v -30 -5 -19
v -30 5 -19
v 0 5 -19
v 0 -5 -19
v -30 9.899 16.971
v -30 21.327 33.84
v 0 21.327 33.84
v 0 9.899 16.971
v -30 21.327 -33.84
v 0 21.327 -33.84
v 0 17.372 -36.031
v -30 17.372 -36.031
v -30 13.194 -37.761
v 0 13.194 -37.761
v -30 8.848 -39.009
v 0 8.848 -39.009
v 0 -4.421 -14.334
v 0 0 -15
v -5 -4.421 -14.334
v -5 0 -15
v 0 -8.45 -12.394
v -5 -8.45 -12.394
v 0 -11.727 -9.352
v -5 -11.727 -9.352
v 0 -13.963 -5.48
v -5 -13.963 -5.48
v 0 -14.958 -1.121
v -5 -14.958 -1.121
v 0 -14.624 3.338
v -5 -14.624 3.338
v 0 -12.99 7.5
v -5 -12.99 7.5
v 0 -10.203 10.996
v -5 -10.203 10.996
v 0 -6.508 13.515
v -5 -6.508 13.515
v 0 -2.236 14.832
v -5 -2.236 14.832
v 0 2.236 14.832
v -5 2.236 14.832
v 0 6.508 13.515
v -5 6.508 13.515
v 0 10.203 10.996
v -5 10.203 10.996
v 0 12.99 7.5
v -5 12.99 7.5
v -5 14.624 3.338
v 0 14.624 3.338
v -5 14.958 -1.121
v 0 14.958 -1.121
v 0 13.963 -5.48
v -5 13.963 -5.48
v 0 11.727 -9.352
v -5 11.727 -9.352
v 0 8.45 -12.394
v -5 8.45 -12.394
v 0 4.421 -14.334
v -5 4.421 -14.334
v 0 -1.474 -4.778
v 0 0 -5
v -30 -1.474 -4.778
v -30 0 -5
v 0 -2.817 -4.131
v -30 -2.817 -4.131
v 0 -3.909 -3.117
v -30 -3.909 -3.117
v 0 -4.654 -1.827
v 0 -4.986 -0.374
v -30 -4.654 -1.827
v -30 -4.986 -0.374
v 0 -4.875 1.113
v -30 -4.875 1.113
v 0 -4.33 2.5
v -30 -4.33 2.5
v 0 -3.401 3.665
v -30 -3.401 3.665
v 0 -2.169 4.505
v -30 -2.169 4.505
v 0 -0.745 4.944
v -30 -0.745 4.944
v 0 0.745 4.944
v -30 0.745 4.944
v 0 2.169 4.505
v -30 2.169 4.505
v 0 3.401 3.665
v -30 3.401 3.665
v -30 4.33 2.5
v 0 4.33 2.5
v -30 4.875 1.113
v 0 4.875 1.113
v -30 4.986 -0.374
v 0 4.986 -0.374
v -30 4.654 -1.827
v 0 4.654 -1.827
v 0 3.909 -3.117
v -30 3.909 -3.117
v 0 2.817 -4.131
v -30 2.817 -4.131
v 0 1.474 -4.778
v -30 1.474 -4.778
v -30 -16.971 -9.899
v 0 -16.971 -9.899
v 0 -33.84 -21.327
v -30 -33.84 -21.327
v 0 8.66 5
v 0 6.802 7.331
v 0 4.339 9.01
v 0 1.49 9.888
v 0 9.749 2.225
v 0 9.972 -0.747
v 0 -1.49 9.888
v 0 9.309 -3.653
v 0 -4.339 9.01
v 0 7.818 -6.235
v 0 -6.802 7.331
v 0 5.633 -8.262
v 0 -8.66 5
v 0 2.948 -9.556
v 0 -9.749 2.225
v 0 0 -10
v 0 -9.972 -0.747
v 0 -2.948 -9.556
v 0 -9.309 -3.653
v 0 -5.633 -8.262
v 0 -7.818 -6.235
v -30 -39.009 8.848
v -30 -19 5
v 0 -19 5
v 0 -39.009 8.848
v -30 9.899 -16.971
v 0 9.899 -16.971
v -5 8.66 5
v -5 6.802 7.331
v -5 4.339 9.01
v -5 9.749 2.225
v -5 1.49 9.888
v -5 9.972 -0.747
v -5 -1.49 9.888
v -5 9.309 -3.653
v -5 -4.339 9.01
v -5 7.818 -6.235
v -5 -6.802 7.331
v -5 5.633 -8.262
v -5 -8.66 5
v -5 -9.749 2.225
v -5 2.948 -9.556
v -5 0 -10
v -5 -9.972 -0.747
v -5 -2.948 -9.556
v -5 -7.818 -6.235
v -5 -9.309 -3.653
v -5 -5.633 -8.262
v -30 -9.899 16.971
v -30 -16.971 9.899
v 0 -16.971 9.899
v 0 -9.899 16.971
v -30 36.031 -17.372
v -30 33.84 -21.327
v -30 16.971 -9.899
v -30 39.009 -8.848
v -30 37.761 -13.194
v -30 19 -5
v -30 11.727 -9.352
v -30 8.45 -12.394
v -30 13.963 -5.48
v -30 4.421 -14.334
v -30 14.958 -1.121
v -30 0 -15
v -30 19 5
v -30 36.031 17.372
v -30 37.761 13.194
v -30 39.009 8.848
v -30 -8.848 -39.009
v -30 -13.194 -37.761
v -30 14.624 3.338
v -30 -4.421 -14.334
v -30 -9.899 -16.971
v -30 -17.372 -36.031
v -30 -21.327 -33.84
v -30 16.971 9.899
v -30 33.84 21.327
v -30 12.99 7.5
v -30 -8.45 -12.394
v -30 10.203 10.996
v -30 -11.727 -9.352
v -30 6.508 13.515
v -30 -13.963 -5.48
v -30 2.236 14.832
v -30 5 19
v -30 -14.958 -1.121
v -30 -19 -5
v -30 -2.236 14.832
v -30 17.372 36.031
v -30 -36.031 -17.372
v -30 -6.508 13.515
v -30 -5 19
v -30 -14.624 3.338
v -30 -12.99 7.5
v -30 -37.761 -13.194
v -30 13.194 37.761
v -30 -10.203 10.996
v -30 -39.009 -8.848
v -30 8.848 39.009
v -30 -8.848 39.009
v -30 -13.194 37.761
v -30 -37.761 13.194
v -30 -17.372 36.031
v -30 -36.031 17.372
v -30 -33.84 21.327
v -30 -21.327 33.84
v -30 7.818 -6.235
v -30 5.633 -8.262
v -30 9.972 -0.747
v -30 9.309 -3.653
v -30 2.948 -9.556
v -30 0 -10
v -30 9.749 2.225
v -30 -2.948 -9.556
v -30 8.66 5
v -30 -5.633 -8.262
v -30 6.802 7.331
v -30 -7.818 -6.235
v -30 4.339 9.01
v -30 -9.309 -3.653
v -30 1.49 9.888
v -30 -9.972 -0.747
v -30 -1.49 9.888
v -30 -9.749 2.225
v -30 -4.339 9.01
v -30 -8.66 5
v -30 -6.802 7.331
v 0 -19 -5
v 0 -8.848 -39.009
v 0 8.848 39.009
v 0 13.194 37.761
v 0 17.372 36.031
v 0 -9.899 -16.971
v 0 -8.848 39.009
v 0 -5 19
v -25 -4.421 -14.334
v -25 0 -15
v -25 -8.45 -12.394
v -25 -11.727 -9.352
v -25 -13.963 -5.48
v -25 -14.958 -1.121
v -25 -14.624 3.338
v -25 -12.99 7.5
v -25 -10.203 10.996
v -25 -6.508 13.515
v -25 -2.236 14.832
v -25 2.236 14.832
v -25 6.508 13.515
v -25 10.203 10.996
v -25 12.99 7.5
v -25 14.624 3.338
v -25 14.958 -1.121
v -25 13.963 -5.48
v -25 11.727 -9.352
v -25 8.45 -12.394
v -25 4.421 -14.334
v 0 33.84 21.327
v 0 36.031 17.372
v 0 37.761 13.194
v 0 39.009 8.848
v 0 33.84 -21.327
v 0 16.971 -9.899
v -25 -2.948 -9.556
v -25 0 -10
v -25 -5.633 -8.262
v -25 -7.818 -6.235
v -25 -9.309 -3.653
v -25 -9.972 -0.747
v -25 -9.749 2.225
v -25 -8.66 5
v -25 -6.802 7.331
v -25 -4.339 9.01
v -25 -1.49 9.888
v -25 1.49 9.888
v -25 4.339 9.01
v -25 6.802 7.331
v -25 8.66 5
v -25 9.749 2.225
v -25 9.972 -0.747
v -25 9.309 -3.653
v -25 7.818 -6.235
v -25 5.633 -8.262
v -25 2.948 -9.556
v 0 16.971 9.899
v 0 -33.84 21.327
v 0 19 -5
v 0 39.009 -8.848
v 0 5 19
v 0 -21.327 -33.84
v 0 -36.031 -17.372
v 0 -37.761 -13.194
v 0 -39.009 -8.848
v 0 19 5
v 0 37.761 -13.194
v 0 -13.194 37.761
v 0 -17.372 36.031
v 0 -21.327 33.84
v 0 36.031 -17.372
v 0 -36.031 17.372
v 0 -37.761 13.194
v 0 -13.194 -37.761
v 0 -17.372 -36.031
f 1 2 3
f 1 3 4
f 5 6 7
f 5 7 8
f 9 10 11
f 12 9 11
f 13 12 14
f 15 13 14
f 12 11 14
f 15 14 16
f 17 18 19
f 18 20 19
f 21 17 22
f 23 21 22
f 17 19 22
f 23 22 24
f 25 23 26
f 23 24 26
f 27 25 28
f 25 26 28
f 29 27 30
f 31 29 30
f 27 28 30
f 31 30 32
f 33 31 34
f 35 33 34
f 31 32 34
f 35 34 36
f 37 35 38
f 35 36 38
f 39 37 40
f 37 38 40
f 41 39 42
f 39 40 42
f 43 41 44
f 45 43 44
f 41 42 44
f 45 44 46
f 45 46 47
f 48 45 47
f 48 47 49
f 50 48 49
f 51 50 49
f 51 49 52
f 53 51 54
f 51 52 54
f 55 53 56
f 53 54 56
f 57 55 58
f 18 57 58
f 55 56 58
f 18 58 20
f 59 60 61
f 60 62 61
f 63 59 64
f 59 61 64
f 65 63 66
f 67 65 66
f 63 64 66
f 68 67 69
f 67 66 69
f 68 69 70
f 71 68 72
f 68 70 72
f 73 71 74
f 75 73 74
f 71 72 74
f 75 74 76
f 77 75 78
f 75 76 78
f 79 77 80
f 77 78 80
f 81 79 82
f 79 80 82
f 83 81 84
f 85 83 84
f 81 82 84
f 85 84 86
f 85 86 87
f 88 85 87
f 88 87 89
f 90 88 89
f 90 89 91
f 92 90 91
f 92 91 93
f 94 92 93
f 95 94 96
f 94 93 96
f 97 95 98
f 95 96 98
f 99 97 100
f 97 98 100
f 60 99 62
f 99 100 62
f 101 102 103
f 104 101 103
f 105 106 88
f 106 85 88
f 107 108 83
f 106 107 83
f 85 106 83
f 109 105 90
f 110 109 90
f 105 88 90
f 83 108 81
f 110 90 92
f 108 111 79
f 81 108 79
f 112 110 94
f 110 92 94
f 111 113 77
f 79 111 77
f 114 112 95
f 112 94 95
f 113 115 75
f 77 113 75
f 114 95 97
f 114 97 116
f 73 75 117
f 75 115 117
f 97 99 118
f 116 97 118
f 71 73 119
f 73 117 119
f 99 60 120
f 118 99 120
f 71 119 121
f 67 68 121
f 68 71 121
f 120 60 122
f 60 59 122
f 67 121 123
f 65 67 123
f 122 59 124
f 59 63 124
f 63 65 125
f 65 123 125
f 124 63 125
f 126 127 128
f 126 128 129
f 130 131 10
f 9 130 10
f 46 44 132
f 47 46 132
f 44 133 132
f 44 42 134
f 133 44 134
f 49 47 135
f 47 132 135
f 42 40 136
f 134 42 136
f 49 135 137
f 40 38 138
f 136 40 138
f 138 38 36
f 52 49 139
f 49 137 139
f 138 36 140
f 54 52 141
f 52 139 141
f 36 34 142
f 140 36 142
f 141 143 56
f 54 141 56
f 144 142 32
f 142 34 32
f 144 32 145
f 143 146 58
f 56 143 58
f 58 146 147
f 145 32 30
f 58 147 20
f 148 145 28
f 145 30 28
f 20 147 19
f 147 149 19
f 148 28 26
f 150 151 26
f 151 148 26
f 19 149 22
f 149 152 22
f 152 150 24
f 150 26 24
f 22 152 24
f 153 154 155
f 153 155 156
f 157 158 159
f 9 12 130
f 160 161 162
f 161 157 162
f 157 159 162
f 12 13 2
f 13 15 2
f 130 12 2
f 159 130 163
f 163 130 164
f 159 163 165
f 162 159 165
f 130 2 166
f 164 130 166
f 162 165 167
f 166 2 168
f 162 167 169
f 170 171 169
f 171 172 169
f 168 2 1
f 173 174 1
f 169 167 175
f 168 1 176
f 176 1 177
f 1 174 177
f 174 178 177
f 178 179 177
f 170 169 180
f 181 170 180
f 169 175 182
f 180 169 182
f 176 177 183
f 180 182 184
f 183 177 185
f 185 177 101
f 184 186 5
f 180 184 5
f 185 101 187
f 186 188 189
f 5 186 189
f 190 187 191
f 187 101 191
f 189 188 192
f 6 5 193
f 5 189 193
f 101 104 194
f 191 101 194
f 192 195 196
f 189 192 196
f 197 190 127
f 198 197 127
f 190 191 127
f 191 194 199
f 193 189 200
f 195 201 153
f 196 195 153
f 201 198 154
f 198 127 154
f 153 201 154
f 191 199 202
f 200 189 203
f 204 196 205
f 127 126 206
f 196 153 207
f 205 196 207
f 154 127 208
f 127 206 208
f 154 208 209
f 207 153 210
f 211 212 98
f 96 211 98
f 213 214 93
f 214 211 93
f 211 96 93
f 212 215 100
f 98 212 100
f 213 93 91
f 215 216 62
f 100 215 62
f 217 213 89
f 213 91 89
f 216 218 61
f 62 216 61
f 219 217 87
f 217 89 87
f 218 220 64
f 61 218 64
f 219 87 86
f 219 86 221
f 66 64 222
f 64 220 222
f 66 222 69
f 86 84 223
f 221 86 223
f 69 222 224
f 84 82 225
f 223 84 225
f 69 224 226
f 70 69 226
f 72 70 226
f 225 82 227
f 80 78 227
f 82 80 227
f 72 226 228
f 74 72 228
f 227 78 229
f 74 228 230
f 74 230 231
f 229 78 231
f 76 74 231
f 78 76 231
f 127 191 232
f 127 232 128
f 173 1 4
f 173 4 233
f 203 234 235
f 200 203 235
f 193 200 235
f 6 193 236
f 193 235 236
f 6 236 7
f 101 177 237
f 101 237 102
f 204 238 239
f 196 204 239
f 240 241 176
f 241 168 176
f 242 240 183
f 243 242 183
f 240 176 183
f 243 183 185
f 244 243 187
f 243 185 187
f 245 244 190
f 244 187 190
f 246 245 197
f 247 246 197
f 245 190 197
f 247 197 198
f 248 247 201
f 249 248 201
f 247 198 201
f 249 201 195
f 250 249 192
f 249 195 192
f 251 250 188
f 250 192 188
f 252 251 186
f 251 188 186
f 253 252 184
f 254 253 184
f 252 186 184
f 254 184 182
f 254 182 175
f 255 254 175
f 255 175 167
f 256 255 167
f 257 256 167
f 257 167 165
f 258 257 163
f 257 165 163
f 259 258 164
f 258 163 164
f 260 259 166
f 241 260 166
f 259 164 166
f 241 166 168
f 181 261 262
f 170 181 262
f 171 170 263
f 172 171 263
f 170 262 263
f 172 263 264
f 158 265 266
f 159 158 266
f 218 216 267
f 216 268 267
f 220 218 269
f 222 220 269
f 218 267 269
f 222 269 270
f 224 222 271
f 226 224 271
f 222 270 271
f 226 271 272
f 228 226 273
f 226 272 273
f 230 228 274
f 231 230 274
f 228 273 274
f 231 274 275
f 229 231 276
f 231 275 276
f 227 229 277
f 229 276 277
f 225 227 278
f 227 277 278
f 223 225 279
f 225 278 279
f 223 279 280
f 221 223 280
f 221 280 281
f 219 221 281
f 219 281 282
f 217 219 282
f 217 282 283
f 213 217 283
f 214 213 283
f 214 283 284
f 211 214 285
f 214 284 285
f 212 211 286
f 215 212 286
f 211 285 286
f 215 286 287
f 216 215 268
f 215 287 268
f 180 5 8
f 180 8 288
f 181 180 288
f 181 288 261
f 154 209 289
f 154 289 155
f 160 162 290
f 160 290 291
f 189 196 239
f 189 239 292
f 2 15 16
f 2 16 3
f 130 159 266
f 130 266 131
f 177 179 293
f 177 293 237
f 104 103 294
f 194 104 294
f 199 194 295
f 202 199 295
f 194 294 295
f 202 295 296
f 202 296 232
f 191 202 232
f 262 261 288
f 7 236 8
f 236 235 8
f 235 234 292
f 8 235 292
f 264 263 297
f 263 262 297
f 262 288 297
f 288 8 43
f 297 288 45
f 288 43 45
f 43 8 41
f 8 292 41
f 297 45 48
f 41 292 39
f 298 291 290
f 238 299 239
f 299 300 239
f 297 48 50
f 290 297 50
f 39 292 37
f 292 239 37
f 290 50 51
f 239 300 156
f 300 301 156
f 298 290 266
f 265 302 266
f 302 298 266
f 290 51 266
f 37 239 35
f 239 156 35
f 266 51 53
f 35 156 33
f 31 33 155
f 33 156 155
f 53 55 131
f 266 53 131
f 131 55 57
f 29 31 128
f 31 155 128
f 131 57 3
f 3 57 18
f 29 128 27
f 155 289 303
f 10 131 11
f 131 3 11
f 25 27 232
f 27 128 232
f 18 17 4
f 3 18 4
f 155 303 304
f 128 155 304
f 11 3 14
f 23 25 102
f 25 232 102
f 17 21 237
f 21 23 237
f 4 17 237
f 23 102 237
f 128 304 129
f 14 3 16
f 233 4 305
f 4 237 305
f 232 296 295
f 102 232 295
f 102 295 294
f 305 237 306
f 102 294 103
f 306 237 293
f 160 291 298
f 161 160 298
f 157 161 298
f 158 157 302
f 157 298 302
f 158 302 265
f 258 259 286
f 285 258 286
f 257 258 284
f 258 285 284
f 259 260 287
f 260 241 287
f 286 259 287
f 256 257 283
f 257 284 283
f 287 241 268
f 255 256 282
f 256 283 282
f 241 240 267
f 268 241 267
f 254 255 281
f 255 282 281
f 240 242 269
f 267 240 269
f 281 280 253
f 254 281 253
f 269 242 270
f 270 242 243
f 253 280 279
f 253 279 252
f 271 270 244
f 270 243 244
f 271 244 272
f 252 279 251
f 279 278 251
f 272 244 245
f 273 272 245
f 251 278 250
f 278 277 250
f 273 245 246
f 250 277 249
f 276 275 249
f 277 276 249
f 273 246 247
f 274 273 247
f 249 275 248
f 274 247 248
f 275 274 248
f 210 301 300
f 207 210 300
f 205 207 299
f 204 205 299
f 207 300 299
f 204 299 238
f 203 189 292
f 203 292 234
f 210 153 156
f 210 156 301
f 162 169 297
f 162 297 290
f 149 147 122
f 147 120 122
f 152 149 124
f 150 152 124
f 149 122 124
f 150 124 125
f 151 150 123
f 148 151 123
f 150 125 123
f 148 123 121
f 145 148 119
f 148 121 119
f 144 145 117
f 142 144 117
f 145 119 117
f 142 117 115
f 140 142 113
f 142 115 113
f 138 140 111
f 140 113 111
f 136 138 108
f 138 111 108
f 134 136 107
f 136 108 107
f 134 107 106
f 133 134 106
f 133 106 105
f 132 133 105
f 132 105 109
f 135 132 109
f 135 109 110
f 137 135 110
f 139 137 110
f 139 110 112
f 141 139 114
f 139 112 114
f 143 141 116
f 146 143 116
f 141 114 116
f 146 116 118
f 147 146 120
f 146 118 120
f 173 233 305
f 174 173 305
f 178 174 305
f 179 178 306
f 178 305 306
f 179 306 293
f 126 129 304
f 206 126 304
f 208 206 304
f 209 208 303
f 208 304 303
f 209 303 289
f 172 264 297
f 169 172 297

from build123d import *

# Parameters (mm, degrees)
CUT_EXTRUDE6_DEPTH = 65.031242374
CIRPATTERN6_COUNT  = 8


with BuildPart() as part:
    # Sketch2 → Revolve1 (revolve)
    with BuildSketch(Plane.XY, mode=Mode.PRIVATE) as revolve1_sk:
        Polygon((0, 5), (-30, 5), (-30, 10), (-25, 10), (-25, 15), (-30, 15), (-30, 40), (0, 40), (0, 15), (-5, 15), (-5, 10), (0, 10), align=None)
    revolve(revolve1_sk.sketch.rotate(Axis((0, 0, 0), (-1, 0, 0)), 90), axis=Axis((0, 0, 0), (-1, 0, 0)))

    # Sketch8 → Cut-Extrude6 (cut, through all)
    with BuildSketch(Plane.ZY.offset(30)):
        Polygon((-10, 45), (10, 45), (5, 19), (-5, 19), align=None)
    cut_extrude6 = extrude(amount=-CUT_EXTRUDE6_DEPTH, mode=Mode.SUBTRACT)

    # CirPattern6: Cut-Extrude6 ×8 about axis
    cirpattern6_axis = Axis((0, 0, 0), (1, 0, 0))
    for i in range(1, CIRPATTERN6_COUNT):
        add(cut_extrude6.rotate(cirpattern6_axis, i * 360 / CIRPATTERN6_COUNT), mode=Mode.SUBTRACT)


solid = part.part
